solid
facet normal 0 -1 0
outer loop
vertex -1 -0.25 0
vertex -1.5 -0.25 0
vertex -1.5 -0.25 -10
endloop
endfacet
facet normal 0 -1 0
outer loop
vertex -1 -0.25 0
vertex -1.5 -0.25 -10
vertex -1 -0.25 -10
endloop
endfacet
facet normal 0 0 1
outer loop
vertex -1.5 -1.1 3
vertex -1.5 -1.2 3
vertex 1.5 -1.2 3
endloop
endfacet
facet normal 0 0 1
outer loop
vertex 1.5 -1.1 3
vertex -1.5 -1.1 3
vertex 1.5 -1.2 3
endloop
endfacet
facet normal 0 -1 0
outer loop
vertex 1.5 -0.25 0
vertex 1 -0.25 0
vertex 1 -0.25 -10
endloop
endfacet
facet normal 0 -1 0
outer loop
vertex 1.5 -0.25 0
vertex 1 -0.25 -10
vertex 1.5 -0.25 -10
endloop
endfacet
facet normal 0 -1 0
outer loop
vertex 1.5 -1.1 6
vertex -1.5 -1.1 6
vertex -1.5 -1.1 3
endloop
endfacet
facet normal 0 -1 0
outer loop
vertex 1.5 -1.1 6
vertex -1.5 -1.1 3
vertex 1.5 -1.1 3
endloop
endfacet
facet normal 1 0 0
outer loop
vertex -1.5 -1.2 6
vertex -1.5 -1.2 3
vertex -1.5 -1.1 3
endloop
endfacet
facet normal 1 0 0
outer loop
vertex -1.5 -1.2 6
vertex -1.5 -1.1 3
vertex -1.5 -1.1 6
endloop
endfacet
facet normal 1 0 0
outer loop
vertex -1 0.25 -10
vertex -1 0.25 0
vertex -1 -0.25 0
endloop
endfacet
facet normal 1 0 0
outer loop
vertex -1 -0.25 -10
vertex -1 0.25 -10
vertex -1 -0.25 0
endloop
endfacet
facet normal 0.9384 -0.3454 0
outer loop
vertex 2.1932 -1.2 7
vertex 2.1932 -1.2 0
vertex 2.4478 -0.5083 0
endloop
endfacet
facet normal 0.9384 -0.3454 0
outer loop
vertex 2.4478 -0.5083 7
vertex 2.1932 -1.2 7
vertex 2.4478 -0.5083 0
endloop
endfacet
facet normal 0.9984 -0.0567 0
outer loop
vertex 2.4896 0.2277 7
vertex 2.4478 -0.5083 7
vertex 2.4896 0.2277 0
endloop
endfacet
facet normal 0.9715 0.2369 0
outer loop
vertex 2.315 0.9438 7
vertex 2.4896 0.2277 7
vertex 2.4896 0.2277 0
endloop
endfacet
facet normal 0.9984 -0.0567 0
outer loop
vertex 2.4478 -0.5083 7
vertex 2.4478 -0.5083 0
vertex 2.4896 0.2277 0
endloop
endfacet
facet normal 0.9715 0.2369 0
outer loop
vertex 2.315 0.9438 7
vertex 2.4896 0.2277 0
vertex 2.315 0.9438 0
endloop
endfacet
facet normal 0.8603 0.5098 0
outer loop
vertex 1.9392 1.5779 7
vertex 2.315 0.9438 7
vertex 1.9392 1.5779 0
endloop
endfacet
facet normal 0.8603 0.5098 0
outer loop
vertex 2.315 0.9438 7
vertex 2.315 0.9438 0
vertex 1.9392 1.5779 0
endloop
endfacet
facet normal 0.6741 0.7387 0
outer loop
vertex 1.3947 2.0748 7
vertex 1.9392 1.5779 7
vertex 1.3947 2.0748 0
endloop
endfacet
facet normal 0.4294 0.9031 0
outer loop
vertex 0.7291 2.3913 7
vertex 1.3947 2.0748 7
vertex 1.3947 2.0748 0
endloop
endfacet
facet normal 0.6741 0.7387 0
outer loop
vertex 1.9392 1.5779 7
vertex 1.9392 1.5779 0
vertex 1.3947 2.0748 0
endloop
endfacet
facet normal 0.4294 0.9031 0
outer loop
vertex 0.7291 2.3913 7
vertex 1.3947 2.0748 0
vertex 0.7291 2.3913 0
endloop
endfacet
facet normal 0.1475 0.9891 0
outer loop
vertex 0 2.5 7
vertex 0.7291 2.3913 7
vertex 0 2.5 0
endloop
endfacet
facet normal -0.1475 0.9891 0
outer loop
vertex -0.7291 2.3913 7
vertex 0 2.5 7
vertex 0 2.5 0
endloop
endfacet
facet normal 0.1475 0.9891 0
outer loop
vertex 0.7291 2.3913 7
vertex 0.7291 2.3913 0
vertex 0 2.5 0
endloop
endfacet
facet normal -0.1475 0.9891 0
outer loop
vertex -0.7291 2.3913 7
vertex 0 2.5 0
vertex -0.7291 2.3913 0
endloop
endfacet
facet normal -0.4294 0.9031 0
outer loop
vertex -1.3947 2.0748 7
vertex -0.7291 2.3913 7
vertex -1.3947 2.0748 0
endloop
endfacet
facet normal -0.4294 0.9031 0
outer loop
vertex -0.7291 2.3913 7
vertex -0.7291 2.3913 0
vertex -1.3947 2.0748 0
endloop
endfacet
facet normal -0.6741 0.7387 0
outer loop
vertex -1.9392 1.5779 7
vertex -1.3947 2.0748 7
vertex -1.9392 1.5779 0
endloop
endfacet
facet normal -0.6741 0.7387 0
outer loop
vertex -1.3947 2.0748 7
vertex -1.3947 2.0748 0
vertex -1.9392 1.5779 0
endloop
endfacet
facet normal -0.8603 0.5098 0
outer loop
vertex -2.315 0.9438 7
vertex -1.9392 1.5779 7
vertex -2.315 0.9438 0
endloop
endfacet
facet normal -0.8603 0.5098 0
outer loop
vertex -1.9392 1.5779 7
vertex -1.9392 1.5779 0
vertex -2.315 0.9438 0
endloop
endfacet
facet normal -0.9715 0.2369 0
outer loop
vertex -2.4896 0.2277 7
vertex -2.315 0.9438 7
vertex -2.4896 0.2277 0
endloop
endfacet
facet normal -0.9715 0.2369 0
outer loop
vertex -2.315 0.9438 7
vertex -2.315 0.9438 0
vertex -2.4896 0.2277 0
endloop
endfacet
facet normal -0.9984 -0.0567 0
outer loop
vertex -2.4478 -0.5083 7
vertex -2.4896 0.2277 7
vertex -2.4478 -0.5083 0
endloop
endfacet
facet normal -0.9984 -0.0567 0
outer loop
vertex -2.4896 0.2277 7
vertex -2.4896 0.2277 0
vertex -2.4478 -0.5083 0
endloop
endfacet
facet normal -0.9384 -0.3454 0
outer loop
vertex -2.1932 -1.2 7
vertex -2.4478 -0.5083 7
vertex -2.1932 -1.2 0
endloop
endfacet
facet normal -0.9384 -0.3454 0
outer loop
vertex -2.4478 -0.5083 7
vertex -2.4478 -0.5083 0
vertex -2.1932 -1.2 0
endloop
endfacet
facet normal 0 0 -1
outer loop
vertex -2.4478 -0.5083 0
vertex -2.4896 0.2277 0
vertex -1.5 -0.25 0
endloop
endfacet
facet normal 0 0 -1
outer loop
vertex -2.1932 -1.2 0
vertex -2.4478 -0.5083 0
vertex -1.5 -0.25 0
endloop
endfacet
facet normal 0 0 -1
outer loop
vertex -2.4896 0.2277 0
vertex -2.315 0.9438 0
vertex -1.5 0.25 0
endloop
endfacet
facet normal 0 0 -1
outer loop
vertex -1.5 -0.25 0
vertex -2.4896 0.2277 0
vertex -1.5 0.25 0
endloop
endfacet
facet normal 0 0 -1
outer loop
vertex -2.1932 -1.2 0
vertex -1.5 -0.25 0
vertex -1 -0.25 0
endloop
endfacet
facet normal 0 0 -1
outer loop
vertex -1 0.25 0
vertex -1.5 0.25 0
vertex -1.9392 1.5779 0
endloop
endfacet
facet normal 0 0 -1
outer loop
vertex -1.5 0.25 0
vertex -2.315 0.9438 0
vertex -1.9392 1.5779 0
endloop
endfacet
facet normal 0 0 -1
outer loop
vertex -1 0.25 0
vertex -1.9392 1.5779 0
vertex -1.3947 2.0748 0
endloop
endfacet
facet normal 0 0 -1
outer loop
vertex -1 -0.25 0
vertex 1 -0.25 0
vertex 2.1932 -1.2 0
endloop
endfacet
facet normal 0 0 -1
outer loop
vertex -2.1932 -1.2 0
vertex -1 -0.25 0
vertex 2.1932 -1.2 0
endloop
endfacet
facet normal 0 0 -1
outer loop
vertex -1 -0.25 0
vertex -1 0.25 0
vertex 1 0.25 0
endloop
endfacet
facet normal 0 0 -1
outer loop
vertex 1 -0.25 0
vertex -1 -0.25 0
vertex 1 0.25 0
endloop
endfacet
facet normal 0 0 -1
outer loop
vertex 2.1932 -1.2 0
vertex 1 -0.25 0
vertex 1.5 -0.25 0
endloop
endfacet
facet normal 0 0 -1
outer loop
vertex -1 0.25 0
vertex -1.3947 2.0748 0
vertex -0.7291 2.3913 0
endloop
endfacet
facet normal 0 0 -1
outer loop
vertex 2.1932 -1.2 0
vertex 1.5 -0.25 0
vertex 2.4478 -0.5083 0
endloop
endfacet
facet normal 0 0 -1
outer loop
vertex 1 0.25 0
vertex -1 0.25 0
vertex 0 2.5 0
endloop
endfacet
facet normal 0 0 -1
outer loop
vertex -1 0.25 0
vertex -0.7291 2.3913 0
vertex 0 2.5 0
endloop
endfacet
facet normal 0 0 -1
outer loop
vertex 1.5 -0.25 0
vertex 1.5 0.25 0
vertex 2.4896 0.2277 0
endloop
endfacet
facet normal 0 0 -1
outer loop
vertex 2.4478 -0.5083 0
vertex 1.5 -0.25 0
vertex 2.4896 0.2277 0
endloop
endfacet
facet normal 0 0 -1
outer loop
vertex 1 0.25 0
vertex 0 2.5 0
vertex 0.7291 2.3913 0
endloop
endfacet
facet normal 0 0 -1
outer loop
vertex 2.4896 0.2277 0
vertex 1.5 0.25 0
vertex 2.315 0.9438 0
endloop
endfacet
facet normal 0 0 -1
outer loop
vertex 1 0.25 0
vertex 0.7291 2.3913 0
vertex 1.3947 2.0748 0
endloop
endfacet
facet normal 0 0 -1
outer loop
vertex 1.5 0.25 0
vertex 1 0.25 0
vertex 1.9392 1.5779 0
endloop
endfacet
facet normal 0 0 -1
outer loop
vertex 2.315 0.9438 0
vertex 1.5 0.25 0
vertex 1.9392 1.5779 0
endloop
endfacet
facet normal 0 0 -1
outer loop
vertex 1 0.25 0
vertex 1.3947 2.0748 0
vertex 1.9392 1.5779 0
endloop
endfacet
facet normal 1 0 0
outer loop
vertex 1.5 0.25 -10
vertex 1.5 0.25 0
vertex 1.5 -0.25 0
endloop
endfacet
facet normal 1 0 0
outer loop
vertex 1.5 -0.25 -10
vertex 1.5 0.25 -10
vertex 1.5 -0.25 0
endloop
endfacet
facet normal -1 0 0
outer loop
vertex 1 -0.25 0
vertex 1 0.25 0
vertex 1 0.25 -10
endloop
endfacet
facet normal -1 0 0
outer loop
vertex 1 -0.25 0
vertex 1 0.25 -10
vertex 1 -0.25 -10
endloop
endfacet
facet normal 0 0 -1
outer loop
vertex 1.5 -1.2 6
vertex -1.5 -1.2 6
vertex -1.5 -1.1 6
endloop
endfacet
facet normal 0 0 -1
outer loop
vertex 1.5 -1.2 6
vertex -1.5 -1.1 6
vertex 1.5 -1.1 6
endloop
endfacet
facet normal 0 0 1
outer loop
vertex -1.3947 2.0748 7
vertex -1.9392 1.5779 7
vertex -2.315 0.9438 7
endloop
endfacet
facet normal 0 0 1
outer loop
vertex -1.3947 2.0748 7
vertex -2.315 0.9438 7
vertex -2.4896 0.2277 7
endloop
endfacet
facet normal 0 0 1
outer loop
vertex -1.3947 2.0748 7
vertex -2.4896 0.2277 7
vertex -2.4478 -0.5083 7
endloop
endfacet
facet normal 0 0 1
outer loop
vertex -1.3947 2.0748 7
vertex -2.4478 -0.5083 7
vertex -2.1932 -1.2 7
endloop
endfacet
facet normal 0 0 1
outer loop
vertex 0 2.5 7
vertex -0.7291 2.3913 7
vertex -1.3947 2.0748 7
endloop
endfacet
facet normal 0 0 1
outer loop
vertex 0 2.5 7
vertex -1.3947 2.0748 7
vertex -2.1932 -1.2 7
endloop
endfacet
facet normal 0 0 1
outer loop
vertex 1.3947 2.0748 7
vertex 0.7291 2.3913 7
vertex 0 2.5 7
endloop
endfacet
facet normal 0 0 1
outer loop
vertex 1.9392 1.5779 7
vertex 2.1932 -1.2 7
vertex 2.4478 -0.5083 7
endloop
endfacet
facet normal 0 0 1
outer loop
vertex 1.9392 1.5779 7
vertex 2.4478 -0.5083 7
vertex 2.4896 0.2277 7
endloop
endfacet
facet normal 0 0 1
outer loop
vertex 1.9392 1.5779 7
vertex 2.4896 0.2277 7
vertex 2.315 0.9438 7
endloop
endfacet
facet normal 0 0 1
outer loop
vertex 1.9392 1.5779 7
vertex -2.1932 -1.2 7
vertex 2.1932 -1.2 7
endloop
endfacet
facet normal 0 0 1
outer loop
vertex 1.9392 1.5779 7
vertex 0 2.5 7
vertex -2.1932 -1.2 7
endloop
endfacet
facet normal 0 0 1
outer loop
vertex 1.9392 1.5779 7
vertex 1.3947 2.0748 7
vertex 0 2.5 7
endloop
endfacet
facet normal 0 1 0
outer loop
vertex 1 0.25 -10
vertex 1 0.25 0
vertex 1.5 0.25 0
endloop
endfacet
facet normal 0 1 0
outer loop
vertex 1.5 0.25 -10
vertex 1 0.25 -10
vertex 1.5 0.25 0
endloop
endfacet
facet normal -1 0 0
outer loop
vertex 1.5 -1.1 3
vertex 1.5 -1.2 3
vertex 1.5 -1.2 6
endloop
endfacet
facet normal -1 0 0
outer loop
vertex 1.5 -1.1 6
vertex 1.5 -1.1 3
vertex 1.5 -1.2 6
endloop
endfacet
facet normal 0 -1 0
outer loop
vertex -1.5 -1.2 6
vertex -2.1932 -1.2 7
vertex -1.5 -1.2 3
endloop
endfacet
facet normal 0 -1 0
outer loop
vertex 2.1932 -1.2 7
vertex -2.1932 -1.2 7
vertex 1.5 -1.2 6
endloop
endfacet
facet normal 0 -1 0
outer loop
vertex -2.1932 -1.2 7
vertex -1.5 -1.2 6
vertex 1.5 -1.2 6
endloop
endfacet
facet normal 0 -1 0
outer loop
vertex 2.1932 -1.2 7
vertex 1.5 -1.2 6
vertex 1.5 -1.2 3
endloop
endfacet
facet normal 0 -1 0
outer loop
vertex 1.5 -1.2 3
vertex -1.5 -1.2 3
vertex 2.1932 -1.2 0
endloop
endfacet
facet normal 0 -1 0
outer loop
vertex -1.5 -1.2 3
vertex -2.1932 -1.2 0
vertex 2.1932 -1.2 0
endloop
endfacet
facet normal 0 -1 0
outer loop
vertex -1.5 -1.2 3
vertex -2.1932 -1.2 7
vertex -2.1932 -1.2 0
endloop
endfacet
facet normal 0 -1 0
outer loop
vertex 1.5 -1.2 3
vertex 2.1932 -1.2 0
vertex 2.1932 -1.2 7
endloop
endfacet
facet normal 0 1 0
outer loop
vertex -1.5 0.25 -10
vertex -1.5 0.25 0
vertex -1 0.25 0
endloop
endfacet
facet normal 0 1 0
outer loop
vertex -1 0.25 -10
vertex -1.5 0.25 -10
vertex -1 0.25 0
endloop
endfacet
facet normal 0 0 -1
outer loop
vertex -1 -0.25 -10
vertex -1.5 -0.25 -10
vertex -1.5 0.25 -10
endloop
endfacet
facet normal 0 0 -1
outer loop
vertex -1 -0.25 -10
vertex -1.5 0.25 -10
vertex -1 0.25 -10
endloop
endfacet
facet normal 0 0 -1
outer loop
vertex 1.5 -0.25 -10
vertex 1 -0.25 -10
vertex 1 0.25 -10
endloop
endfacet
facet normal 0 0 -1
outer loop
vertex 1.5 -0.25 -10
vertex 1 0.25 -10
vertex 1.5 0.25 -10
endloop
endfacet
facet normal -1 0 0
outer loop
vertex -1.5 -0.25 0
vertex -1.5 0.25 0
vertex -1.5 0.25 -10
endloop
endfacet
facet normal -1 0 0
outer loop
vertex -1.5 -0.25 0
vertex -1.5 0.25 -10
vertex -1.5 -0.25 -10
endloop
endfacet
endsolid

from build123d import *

# Parameters (mm, degrees)
PAD005_DEPTH    = 7
SKETCH018_W     = 0.5
SKETCH018_H     = 0.5
PAD006_DEPTH    = 10
SKETCH019_W     = 3
SKETCH019_H     = 3
POCKET003_DEPTH = 0.1


with BuildPart() as part:
    # Sketch017 → Pad005 (new body)
    with BuildSketch(Plane.XY):
        with BuildLine():
            ThreePointArc((2.193171, -1.2), (0, 2.5), (-2.193171, -1.2))
            Line((-2.193171, -1.2), (2.193171, -1.2))
        make_face()
    extrude(amount=PAD005_DEPTH)

    # Sketch018 (on Face3 of Pad005) → Pad006 (join)
    with BuildSketch(Plane(origin=(0, 0, 0), x_dir=(1, 0, 0), z_dir=(0, 0, -1))):
        with Locations((-1.25, 0)):
            Rectangle(SKETCH018_W, SKETCH018_H)
        with Locations((1.25, 0)):
            Rectangle(SKETCH018_W, SKETCH018_H)
    extrude(amount=PAD006_DEPTH)

    # Sketch019 (on Face2 of Pad006) → Pocket003 (cut)
    with BuildSketch(Plane.XZ.offset(1.2)):
        with Locations((0, 4.5)):
            Rectangle(SKETCH019_W, SKETCH019_H)
    extrude(amount=-POCKET003_DEPTH, mode=Mode.SUBTRACT)


solid = part.part
